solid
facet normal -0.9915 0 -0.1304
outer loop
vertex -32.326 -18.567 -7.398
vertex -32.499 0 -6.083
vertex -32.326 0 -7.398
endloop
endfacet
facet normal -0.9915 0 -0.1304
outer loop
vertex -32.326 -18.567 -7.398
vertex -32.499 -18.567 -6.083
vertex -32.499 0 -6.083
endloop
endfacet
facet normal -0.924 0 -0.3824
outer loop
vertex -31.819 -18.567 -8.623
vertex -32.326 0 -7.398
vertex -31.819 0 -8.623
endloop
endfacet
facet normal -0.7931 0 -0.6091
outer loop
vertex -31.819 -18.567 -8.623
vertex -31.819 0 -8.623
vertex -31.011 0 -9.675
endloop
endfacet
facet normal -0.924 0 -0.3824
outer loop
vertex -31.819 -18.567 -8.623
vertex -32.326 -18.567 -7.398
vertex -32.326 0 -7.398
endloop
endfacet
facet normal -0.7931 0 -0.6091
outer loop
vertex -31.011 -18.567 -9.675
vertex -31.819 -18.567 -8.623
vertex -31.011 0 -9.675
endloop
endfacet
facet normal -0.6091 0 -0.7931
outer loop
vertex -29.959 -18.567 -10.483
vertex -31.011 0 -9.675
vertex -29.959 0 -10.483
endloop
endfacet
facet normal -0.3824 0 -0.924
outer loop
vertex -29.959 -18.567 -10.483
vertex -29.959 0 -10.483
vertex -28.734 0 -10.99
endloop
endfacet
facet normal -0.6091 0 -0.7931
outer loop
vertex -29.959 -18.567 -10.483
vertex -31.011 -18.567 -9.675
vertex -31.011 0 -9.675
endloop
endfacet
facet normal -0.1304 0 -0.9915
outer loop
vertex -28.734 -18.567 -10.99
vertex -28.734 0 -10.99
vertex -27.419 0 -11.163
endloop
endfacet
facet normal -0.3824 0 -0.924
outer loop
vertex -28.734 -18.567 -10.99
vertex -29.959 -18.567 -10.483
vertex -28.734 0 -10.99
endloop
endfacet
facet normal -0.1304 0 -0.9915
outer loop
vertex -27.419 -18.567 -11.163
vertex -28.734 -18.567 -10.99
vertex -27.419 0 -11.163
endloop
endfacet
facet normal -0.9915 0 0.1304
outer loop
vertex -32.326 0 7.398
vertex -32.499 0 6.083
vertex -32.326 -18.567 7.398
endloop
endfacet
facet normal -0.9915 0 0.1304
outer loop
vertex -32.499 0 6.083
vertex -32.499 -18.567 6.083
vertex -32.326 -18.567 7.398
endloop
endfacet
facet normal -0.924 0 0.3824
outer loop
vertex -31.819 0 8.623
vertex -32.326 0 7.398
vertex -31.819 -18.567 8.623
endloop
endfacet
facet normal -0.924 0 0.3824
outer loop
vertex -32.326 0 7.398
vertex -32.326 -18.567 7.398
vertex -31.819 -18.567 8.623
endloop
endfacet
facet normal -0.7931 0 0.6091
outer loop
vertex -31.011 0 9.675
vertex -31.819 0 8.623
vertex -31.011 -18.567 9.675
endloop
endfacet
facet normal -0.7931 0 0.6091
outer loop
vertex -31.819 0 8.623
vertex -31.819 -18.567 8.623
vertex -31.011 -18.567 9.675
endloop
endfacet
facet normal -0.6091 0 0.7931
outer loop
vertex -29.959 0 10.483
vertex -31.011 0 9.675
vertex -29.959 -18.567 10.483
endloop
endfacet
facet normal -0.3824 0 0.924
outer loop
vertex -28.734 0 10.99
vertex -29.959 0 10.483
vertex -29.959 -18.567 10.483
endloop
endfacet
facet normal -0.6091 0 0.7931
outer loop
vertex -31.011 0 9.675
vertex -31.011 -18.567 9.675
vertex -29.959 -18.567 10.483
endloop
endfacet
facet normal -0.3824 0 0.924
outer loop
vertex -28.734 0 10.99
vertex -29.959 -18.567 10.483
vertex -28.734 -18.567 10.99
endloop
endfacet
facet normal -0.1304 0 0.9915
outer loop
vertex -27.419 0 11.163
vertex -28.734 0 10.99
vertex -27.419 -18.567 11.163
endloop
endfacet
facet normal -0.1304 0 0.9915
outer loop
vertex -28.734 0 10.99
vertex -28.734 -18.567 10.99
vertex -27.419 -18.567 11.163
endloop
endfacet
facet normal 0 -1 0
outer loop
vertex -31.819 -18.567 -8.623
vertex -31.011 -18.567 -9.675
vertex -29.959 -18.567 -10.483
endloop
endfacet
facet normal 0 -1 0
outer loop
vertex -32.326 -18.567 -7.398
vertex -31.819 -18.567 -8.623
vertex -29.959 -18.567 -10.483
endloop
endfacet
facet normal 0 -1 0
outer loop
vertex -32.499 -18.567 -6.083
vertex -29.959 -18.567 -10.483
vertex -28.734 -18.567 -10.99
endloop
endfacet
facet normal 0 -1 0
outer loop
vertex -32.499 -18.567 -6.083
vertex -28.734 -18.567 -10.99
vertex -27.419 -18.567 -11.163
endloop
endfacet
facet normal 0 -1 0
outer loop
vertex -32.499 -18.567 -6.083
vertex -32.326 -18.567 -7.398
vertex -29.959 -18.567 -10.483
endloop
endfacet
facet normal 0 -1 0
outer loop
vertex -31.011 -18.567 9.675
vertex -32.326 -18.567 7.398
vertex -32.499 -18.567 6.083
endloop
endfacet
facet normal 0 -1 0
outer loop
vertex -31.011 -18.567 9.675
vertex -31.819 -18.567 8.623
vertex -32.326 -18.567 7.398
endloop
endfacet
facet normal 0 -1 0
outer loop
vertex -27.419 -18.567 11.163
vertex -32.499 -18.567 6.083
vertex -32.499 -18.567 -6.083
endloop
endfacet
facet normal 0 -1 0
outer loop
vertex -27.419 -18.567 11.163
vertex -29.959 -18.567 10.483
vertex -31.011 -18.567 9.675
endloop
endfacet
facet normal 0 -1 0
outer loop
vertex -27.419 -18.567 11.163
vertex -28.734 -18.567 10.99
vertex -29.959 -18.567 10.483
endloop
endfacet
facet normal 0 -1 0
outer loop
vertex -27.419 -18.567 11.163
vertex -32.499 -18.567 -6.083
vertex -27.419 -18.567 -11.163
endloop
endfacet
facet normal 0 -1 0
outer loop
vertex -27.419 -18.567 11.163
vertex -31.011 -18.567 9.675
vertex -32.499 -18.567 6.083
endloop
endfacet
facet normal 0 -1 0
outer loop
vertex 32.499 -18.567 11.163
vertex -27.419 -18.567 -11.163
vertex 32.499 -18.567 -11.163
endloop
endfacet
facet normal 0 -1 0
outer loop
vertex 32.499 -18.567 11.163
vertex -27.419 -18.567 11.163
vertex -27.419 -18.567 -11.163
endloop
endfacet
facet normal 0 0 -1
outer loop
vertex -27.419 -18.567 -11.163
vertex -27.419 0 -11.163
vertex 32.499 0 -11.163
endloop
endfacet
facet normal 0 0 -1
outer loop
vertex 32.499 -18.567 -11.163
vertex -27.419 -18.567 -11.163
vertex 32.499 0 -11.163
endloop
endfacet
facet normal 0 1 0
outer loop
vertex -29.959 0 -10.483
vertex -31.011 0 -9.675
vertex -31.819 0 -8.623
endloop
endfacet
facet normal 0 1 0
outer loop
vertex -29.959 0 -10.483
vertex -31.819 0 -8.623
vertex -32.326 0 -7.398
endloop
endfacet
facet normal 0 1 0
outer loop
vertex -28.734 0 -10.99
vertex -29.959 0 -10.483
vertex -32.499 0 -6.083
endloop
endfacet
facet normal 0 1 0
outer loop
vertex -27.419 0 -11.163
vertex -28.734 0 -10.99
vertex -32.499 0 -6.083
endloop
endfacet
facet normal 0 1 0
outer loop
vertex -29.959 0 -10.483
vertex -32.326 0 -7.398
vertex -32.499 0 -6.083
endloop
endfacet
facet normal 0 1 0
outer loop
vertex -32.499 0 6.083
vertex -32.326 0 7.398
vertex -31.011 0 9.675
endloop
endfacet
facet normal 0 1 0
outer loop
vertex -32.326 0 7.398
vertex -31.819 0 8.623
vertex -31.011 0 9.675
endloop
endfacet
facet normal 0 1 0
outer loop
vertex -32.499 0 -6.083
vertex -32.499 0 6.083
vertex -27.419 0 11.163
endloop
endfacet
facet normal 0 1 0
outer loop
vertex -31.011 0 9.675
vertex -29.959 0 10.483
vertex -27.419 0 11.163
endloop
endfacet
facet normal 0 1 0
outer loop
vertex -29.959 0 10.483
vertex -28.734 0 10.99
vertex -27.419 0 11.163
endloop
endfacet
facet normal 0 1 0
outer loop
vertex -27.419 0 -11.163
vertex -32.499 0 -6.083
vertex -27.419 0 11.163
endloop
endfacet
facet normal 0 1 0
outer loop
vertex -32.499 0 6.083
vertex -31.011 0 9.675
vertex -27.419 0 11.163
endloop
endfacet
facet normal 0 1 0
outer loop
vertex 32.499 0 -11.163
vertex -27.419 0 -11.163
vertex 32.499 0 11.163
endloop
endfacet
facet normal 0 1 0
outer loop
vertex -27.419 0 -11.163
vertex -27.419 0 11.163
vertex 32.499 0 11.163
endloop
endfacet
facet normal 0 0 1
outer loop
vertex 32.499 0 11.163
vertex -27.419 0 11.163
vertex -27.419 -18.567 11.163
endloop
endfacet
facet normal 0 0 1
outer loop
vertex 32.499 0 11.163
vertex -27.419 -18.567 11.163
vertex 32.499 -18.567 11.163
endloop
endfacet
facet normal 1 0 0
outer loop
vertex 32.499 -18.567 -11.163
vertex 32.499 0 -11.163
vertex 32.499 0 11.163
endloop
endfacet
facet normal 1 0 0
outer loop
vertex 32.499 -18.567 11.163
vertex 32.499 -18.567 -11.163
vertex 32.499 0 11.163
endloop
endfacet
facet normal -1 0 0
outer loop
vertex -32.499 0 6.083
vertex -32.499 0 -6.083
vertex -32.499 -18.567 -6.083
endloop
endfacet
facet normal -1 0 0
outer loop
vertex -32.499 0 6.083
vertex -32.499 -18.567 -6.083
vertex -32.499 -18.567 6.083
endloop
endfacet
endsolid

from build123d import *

# Parameters (mm, degrees)
F0_W     = 64.9986
F0_H     = 22.3266
F1_DEPTH = 18.5674
F2_R     = 5.08


with BuildPart() as f1:
    # F0 (on Front) → F1 (new body)
    with BuildSketch(Plane.XZ):
        Rectangle(F0_W, F0_H)
    extrude(amount=F1_DEPTH)

    # F2
    f2_edges = [f1.edges().sort_by_distance(p)[0] for p in [
        (-32.4993, -9.2837, 11.1633),
        (-32.4993, -9.2837, -11.1633),
    ]]
    fillet(f2_edges, radius=F2_R)


solid = f1.part
